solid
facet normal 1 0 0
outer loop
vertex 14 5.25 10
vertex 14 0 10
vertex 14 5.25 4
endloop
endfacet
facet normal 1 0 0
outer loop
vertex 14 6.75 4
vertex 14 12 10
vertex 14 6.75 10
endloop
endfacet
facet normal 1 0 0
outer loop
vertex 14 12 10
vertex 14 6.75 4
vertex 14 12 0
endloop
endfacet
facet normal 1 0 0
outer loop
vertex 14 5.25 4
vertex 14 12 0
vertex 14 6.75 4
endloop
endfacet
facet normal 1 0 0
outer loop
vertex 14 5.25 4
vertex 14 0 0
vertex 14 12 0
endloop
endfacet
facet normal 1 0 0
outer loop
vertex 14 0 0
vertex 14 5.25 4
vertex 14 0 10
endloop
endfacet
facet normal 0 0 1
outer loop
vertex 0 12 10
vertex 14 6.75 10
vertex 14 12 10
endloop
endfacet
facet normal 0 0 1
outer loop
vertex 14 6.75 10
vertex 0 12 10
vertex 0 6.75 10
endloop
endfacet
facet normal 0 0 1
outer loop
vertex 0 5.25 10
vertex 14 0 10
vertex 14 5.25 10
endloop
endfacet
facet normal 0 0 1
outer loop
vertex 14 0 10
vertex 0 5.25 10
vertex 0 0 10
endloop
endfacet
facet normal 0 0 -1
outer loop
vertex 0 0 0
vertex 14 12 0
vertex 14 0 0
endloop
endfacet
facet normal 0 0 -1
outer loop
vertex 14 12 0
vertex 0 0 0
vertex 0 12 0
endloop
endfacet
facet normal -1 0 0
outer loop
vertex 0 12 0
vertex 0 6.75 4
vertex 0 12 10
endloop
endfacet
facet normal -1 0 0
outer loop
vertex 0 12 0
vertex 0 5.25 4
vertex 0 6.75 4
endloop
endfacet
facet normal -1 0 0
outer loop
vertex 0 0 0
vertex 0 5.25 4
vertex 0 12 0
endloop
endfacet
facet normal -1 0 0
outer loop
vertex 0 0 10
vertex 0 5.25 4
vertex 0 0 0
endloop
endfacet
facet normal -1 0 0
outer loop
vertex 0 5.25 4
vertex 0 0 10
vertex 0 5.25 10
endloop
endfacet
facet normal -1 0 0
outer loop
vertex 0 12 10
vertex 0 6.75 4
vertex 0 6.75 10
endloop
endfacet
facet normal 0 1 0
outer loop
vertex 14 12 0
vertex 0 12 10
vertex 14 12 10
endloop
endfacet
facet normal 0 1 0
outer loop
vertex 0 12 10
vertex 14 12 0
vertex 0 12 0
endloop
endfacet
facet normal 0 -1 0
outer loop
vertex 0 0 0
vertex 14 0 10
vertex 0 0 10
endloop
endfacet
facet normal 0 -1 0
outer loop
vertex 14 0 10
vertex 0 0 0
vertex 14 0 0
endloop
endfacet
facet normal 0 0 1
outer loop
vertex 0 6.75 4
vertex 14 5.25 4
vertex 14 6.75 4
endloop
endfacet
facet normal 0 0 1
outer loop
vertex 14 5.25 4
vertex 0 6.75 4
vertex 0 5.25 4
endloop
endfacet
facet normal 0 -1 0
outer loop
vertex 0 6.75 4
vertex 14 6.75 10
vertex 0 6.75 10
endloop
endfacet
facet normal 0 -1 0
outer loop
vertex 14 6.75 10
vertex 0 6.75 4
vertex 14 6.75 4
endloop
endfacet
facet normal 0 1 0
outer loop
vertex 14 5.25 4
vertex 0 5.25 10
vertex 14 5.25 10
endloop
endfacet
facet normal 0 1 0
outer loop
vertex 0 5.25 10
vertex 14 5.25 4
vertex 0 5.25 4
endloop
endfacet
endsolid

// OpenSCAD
$fn = 32;

// ----------------------------------------------------------------------
// Micro clip: slotted block, 5-20 mm class
// ----------------------------------------------------------------------

// --- parameters (mm) ---
block_l = 14;             // block length, X
block_w = 12;             // block width, Y
block_h = 10;             // block height, Z
slot_w = 1.5;             // slot width
slot_d = 6;               // slot depth from the top

difference() {
  cube([block_l, block_w, block_h]);
  translate([-1, block_w / 2 - slot_w / 2, block_h - slot_d])
    cube([block_l + 2, slot_w, slot_d + 1]);
}
